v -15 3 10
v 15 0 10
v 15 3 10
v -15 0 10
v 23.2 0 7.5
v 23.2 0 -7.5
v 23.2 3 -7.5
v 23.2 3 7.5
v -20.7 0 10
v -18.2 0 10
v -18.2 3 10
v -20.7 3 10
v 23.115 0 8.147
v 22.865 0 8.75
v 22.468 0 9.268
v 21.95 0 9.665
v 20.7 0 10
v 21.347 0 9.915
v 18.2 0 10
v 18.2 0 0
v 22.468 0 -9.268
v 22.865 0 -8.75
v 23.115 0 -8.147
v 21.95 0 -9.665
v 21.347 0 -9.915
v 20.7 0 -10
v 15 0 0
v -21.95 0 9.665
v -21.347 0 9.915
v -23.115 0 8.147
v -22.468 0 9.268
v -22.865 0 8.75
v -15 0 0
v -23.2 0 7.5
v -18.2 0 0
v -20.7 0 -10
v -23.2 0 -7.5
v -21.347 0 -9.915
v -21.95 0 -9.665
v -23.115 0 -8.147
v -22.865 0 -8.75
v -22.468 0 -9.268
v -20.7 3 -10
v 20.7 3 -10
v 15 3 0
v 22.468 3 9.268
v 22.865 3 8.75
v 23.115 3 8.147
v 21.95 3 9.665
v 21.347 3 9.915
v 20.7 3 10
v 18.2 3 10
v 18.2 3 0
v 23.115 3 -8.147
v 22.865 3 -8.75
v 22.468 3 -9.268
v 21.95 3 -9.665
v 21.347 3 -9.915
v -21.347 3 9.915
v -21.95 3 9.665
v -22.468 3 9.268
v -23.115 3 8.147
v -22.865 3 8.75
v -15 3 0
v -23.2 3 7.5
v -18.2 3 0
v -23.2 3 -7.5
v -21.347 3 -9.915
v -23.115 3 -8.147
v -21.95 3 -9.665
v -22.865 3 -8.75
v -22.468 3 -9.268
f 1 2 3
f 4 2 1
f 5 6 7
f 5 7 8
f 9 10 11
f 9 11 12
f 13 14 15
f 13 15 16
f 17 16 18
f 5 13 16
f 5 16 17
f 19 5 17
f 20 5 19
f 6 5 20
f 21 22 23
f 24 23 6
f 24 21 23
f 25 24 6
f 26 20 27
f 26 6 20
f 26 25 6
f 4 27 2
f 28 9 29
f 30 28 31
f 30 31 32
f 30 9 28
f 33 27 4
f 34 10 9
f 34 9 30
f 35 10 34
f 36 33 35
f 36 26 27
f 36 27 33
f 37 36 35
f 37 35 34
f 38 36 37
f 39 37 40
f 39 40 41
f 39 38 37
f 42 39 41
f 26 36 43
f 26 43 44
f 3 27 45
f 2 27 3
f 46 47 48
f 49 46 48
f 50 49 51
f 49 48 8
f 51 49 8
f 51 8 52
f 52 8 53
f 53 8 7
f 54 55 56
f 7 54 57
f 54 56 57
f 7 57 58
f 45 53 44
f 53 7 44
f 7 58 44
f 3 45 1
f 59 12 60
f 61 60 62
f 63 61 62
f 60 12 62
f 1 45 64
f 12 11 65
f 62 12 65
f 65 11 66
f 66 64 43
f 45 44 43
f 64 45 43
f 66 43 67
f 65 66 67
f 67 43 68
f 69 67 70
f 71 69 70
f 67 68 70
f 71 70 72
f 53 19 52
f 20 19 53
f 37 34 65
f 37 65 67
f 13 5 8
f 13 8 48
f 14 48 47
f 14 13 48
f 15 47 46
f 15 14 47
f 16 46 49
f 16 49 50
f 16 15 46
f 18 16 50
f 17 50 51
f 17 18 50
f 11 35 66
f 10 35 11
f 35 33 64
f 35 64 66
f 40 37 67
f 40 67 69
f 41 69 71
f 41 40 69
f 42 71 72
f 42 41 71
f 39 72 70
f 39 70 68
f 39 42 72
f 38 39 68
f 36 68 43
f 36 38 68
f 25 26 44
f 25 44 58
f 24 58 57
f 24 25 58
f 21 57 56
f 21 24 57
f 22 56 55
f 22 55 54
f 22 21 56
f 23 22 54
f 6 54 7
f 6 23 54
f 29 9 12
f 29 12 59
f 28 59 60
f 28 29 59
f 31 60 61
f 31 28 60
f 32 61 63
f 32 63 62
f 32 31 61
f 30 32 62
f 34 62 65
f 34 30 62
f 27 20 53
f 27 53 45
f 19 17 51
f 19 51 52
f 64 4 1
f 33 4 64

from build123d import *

# Parameters (mm, degrees)
EXTRUDE_1_DEPTH = 3


with BuildPart() as part:
    # 草图1 → 凸台-拉伸1 (new body)
    with BuildSketch(Plane(origin=(0, 0, 0), x_dir=(1, 0, 0), z_dir=(0, 1, 0))):
        with BuildLine():
            Line((15, 10), (20.7, 10))
            ThreePointArc((20.7, 10), (22.467766953, 9.267766953), (23.2, 7.5))
            Line((23.2, 7.5), (23.2, -7.5))
            ThreePointArc((23.2, -7.5), (22.467766953, -9.267766953), (20.7, -10))
            Line((20.7, -10), (18.2, -10))
            Line((18.2, -10), (18.2, 0))
            Line((18.2, 0), (15, 0))
            Line((15, 0), (15, -10))
            Line((15, -10), (-15, -10))
            Line((-15, -10), (-15, 0))
            Line((-15, 0), (-18.2, 0))
            Line((-18.2, 0), (-18.2, -10))
            Line((-18.2, -10), (-20.7, -10))
            ThreePointArc((-20.7, -10), (-22.467766953, -9.267766953), (-23.2, -7.5))
            Line((-23.2, -7.5), (-23.2, 7.5))
            ThreePointArc((-23.2, 7.5), (-22.467766953, 9.267766953), (-20.7, 10))
            Line((-20.7, 10), (-15, 10))
            Line((-15, 10), (15, 10))
        make_face()
    extrude(amount=EXTRUDE_1_DEPTH)


solid = part.part
